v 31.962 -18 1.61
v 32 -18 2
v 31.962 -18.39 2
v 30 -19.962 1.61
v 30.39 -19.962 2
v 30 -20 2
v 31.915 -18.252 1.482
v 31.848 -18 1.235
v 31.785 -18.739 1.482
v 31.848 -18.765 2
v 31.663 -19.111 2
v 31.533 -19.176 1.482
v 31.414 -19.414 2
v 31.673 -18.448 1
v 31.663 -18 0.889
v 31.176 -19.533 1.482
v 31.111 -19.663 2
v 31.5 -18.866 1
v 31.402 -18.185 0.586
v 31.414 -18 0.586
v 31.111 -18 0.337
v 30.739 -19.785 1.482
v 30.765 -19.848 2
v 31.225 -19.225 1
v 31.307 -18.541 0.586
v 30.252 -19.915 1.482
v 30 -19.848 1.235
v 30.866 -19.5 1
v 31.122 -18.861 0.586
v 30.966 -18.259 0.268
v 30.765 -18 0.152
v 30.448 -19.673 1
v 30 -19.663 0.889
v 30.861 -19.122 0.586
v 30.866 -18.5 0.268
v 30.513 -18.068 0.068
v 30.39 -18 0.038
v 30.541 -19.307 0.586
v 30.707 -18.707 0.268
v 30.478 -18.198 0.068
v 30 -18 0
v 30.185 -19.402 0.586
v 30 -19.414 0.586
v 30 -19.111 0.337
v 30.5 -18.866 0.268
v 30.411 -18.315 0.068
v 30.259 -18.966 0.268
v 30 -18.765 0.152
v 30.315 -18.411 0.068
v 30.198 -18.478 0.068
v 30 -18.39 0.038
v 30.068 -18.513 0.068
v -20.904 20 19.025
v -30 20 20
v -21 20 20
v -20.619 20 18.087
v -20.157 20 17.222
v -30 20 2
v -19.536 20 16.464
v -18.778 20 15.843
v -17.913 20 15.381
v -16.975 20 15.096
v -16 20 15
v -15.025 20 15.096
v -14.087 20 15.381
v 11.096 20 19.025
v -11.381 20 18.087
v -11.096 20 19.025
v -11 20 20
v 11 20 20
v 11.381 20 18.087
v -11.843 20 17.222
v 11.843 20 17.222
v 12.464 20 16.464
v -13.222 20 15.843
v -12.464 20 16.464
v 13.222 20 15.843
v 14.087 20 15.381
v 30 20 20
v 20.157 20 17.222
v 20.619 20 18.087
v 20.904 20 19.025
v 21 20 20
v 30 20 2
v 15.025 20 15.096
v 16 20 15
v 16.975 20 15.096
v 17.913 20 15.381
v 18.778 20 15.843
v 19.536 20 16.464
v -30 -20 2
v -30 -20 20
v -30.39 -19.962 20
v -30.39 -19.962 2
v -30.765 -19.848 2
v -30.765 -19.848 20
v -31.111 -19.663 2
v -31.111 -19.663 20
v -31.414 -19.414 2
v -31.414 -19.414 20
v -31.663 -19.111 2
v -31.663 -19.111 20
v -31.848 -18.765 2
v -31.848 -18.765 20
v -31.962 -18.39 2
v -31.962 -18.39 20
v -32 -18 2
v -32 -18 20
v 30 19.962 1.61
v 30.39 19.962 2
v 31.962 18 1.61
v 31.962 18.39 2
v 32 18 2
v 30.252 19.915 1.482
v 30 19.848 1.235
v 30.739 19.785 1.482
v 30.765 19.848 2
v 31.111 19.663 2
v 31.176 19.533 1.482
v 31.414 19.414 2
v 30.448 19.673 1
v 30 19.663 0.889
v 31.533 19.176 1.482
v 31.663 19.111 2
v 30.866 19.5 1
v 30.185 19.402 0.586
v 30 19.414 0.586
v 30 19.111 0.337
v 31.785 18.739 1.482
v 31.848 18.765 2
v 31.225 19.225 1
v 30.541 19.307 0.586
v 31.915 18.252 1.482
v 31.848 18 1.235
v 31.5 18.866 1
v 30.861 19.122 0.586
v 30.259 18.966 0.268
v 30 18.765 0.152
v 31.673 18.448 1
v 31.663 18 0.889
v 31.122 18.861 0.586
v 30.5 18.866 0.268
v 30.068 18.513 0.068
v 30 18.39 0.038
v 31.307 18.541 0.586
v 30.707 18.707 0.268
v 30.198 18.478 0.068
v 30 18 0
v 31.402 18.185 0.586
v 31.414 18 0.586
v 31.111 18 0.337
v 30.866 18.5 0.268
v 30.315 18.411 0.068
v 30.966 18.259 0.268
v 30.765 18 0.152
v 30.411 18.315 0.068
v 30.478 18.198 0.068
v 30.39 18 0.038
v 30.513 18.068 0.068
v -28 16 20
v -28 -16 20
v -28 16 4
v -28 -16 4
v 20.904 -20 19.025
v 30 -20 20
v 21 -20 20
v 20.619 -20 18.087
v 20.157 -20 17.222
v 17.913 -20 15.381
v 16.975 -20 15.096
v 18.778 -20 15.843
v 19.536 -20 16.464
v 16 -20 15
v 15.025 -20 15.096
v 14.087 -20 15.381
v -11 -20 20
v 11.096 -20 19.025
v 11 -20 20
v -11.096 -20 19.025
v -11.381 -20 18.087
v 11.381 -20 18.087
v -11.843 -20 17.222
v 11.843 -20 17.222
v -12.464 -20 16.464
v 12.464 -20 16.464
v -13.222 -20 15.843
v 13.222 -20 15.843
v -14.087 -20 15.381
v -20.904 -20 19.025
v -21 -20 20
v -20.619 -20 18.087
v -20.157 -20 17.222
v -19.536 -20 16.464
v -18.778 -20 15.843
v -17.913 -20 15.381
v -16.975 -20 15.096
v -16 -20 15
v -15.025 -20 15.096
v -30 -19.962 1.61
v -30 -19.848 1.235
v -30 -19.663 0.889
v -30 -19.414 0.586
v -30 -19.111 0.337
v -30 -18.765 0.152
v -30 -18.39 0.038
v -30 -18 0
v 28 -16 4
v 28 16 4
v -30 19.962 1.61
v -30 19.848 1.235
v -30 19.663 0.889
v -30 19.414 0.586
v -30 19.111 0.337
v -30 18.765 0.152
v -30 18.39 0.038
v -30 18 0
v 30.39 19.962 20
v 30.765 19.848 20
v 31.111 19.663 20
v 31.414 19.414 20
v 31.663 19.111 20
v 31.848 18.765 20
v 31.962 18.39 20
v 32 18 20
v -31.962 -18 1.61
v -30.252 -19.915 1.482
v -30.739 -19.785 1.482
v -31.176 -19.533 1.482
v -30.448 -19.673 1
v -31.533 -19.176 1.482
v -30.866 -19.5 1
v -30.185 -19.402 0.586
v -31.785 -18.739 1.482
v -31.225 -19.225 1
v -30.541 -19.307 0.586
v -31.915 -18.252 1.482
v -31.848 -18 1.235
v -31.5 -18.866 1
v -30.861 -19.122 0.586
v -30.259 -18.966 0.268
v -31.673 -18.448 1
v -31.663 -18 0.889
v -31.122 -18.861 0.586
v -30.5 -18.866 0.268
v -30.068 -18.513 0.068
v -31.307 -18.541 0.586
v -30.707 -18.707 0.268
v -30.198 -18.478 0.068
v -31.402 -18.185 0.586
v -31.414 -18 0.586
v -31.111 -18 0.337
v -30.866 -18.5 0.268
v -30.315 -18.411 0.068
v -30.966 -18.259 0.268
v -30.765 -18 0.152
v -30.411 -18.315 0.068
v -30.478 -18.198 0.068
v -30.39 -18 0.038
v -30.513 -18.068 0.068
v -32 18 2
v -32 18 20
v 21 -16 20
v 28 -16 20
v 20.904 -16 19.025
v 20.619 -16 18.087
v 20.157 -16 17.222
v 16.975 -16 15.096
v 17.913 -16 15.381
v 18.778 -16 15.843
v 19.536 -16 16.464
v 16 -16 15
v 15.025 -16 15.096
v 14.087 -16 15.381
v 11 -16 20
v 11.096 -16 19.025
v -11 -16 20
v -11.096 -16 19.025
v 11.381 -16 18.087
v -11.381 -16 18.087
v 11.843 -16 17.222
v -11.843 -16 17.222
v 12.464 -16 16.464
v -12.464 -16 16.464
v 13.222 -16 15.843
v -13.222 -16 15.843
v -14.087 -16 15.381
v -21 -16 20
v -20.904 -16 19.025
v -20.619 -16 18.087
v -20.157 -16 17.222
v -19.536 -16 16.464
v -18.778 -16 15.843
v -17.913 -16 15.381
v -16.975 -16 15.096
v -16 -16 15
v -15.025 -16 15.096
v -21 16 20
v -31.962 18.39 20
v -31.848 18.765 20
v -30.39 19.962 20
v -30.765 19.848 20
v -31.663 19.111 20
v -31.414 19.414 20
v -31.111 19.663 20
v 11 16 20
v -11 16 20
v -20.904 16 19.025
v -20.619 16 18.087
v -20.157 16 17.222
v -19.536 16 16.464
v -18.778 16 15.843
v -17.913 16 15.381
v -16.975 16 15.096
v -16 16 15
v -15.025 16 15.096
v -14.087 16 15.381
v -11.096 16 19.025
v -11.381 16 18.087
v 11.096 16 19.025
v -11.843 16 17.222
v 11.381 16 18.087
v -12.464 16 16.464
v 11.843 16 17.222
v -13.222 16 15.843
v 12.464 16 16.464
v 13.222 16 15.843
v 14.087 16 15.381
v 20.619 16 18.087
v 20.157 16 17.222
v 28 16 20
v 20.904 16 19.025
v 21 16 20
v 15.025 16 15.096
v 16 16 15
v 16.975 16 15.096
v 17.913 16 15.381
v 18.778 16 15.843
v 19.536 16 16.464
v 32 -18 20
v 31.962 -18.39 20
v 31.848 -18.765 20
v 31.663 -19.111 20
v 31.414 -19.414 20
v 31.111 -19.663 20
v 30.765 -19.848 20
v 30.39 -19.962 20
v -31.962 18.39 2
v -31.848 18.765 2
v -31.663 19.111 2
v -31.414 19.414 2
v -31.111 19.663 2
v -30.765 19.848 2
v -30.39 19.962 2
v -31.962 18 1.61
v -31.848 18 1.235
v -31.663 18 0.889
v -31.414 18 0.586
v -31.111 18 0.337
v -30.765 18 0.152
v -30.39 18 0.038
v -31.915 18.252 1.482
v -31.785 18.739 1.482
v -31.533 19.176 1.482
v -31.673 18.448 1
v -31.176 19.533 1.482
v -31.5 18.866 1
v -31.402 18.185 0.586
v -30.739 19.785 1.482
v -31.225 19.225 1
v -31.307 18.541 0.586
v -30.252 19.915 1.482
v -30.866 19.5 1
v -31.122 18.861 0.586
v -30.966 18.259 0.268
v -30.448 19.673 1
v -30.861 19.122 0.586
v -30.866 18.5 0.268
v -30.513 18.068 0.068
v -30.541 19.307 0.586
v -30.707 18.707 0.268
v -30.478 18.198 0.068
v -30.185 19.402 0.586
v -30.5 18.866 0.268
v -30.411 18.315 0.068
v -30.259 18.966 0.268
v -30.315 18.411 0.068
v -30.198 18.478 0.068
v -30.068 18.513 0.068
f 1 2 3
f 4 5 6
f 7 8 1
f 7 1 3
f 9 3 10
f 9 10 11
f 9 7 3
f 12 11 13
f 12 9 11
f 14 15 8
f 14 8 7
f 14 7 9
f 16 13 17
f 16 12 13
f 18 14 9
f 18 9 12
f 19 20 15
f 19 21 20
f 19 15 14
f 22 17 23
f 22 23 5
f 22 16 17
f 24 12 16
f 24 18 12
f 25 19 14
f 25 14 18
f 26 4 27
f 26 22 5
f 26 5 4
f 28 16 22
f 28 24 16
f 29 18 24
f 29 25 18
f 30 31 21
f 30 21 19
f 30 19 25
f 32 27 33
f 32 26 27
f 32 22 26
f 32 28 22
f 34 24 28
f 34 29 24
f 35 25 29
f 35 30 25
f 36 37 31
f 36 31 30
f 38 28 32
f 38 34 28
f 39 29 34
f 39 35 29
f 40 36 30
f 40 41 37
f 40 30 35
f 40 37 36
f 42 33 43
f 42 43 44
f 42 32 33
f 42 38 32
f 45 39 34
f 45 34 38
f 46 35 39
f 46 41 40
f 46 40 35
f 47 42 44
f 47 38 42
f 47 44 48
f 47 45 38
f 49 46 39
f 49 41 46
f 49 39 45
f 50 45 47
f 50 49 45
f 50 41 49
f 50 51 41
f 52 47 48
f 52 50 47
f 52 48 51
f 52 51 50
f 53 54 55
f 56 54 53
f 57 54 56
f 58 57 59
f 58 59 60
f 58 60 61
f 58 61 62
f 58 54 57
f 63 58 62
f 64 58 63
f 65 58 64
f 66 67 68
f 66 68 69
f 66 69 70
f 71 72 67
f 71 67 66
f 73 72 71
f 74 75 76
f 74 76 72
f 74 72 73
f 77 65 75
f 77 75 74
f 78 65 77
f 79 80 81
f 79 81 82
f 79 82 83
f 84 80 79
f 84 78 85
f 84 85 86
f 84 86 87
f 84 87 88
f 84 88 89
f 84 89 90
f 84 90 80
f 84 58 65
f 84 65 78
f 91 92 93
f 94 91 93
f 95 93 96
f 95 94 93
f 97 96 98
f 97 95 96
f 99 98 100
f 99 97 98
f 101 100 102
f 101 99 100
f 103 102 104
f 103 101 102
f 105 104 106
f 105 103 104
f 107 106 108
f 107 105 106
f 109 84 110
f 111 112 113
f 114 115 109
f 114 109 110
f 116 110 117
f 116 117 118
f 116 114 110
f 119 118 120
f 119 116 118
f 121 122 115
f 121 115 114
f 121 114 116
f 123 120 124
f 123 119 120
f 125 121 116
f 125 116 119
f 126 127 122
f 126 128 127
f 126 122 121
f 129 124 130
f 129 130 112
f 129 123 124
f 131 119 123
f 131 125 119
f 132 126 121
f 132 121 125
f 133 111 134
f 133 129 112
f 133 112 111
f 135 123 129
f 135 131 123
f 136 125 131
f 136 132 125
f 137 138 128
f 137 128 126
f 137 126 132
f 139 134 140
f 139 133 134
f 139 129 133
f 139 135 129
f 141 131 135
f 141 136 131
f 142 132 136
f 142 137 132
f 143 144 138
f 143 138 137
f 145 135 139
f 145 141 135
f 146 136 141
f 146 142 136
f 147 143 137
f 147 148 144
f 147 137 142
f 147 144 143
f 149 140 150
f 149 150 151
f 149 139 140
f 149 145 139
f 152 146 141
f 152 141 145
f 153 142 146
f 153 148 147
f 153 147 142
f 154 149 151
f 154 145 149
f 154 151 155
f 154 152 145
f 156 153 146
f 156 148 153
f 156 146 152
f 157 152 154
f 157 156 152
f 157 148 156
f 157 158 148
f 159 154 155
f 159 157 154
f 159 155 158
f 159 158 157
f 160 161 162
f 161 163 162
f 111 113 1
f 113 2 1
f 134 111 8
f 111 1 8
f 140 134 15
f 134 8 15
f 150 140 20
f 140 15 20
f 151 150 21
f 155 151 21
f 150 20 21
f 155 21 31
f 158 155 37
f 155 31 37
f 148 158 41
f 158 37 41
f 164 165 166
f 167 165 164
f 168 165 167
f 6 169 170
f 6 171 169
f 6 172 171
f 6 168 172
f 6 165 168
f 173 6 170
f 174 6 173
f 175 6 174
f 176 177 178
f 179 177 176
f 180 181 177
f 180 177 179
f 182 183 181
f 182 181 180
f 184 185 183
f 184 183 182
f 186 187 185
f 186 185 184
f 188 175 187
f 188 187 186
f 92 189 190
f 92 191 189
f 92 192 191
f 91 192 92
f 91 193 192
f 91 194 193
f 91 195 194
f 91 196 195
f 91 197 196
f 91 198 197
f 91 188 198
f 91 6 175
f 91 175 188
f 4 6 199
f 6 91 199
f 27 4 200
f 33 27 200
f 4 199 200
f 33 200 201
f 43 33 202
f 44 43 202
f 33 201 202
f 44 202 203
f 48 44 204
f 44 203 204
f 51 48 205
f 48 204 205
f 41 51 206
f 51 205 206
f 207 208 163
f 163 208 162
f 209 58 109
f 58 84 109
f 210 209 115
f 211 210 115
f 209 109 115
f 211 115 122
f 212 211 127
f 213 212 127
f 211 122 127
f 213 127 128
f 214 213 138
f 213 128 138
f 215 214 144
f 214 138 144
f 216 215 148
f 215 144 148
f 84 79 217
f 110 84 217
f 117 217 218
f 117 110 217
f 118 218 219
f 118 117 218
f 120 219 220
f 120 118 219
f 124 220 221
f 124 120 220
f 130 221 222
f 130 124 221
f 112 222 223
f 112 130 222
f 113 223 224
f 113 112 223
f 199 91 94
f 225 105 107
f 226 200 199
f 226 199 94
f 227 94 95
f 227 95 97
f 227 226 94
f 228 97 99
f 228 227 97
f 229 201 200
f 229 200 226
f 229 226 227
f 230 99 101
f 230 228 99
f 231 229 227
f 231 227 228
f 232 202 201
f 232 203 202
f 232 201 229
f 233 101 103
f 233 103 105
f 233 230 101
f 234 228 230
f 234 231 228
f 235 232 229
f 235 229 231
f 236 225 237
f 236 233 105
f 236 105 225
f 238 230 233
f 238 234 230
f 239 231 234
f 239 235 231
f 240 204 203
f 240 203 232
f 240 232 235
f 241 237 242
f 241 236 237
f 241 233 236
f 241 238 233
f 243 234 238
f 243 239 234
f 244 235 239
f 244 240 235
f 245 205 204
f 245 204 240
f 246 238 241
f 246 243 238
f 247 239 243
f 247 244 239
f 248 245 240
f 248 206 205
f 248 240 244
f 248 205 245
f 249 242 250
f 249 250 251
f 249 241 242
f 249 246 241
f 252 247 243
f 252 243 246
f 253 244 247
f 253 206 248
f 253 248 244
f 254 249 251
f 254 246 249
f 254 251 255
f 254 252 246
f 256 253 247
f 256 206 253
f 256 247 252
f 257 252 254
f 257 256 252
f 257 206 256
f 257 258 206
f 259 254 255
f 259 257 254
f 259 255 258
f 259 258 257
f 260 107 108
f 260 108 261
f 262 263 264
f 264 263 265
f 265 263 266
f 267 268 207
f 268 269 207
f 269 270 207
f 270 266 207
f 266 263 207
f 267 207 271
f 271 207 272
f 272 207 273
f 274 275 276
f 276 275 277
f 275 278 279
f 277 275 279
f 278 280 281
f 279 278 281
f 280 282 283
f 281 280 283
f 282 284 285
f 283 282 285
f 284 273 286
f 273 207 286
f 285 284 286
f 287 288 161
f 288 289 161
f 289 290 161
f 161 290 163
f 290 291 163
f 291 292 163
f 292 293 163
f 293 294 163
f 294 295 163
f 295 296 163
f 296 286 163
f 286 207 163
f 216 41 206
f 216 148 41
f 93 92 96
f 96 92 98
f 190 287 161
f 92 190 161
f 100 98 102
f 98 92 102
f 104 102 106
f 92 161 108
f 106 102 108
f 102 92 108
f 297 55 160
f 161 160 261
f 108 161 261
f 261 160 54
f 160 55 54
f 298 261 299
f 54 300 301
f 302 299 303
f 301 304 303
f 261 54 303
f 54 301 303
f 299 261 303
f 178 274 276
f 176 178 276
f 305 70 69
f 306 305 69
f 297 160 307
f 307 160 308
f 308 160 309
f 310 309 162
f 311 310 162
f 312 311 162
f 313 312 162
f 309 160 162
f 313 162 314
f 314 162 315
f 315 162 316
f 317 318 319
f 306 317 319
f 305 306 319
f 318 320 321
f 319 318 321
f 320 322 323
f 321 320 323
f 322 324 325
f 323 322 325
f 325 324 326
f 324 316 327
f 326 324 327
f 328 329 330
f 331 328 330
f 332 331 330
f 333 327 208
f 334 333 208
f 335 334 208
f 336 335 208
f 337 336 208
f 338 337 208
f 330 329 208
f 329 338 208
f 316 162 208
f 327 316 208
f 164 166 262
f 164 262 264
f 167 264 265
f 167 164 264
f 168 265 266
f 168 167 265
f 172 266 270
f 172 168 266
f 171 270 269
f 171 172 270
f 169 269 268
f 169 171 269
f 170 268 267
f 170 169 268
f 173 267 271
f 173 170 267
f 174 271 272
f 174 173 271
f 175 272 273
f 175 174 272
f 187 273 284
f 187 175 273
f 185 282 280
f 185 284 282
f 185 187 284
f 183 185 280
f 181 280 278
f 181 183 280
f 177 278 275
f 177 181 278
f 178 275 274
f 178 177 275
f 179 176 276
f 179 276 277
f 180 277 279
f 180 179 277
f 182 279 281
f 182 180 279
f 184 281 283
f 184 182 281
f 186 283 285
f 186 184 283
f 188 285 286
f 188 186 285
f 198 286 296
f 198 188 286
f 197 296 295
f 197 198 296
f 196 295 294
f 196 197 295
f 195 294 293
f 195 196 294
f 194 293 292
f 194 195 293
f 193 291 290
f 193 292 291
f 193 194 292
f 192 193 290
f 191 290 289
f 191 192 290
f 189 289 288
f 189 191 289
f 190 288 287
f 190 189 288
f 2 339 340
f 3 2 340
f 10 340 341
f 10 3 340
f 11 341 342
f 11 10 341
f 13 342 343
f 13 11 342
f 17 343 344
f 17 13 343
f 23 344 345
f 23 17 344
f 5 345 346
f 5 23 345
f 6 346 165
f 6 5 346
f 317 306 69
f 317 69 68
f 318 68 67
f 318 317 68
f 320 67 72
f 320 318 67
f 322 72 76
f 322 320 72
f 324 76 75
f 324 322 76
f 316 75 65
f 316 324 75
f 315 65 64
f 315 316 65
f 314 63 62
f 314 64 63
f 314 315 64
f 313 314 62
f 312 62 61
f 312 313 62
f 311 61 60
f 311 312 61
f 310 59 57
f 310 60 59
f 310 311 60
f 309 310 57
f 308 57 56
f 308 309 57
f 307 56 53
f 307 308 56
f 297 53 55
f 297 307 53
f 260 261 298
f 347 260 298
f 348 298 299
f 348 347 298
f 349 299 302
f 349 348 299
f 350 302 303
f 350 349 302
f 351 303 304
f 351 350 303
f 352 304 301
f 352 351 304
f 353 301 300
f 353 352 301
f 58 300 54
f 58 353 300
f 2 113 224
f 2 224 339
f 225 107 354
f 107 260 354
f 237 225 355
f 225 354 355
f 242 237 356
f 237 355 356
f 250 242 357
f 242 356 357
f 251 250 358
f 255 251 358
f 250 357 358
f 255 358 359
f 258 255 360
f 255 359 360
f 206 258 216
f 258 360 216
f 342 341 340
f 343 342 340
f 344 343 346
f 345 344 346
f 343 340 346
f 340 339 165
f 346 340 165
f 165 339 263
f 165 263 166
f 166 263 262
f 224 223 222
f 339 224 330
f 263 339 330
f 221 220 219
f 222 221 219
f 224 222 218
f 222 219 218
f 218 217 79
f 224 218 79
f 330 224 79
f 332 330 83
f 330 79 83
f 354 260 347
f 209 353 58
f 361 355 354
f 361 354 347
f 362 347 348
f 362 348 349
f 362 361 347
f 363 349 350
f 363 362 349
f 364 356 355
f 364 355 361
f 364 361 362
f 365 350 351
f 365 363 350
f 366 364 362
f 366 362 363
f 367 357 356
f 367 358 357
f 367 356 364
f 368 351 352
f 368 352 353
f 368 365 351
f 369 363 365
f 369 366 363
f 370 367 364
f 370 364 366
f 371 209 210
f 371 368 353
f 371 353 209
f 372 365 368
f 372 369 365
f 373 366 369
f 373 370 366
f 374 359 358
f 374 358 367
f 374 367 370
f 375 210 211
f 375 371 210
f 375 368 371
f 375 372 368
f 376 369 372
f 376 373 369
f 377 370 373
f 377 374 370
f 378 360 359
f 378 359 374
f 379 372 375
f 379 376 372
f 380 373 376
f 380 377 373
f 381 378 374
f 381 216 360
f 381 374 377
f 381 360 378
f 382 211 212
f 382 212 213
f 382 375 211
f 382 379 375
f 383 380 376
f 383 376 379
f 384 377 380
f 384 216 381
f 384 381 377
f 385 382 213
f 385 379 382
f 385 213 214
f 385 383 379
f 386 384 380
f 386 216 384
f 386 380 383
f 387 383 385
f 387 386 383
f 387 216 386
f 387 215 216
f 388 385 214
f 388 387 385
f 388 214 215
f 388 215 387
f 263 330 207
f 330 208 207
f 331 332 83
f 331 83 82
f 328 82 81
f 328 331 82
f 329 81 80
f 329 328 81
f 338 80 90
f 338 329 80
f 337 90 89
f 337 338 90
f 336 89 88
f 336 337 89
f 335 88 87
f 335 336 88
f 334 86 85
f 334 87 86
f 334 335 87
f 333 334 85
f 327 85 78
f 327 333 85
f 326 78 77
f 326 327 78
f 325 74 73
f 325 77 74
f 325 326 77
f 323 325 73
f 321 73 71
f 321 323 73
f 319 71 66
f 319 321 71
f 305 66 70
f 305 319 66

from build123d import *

# Parameters (mm, degrees)
BOSS_EXTRUDE1_DEPTH     = 20
FILLET1_R               = 2
SHELL1_T                = -4
CUT_EXTRUDE1_DEPTH      = 43.708313008
CUT_EXTRUDE1_DEPTH_BACK = 43.708313008
SKETCH2_R               = 5


with BuildPart() as part:
    # Sketch1 → Boss-Extrude1 (new body)
    with BuildSketch(Plane.XY):
        with BuildLine():
            Line((-30, 20), (30, 20))
            ThreePointArc((30, 20), (31.414213562, 19.414213562), (32, 18))
            Line((32, 18), (32, -18))
            ThreePointArc((32, -18), (31.414213562, -19.414213562), (30, -20))
            Line((30, -20), (-30, -20))
            ThreePointArc((-30, -20), (-31.414213562, -19.414213562), (-32, -18))
            Line((-32, -18), (-32, 18))
            ThreePointArc((-32, 18), (-31.414213562, 19.414213562), (-30, 20))
        make_face()
    extrude(amount=BOSS_EXTRUDE1_DEPTH)

    # Fillet1
    fillet1_edges = [part.edges().sort_by_distance(p)[0] for p in [
        (0, -20, 0),
        (-31.414213562, -19.414213562, 0),
        (-32, 0, 0),
        (-31.414213562, 19.414213562, 0),
        (0, 20, 0),
        (31.414213562, 19.414213562, 0),
        (32, 0, 0),
        (31.414213562, -19.414213562, 0),
    ]]
    fillet(fillet1_edges, radius=FILLET1_R)

    # Shell1
    shell1_openings = [part.faces().sort_by_distance(p)[0] for p in [
        (0, 0, 20),
    ]]
    offset(amount=SHELL1_T, openings=shell1_openings, kind=Kind.INTERSECTION)

    # Sketch2 → Cut-Extrude1 (cut, two sides: drawn at the far end of the back side and taken through both)
    with BuildSketch(Plane(origin=(0, 0, 0), x_dir=(1, 0, 0), z_dir=(0, 1, 0)).offset(-CUT_EXTRUDE1_DEPTH_BACK)):
        with Locations((-16, -20)):
            Circle(SKETCH2_R)
        with Locations((16, -20)):
            Circle(SKETCH2_R)
    extrude(amount=CUT_EXTRUDE1_DEPTH + CUT_EXTRUDE1_DEPTH_BACK, mode=Mode.SUBTRACT)


solid = part.part
